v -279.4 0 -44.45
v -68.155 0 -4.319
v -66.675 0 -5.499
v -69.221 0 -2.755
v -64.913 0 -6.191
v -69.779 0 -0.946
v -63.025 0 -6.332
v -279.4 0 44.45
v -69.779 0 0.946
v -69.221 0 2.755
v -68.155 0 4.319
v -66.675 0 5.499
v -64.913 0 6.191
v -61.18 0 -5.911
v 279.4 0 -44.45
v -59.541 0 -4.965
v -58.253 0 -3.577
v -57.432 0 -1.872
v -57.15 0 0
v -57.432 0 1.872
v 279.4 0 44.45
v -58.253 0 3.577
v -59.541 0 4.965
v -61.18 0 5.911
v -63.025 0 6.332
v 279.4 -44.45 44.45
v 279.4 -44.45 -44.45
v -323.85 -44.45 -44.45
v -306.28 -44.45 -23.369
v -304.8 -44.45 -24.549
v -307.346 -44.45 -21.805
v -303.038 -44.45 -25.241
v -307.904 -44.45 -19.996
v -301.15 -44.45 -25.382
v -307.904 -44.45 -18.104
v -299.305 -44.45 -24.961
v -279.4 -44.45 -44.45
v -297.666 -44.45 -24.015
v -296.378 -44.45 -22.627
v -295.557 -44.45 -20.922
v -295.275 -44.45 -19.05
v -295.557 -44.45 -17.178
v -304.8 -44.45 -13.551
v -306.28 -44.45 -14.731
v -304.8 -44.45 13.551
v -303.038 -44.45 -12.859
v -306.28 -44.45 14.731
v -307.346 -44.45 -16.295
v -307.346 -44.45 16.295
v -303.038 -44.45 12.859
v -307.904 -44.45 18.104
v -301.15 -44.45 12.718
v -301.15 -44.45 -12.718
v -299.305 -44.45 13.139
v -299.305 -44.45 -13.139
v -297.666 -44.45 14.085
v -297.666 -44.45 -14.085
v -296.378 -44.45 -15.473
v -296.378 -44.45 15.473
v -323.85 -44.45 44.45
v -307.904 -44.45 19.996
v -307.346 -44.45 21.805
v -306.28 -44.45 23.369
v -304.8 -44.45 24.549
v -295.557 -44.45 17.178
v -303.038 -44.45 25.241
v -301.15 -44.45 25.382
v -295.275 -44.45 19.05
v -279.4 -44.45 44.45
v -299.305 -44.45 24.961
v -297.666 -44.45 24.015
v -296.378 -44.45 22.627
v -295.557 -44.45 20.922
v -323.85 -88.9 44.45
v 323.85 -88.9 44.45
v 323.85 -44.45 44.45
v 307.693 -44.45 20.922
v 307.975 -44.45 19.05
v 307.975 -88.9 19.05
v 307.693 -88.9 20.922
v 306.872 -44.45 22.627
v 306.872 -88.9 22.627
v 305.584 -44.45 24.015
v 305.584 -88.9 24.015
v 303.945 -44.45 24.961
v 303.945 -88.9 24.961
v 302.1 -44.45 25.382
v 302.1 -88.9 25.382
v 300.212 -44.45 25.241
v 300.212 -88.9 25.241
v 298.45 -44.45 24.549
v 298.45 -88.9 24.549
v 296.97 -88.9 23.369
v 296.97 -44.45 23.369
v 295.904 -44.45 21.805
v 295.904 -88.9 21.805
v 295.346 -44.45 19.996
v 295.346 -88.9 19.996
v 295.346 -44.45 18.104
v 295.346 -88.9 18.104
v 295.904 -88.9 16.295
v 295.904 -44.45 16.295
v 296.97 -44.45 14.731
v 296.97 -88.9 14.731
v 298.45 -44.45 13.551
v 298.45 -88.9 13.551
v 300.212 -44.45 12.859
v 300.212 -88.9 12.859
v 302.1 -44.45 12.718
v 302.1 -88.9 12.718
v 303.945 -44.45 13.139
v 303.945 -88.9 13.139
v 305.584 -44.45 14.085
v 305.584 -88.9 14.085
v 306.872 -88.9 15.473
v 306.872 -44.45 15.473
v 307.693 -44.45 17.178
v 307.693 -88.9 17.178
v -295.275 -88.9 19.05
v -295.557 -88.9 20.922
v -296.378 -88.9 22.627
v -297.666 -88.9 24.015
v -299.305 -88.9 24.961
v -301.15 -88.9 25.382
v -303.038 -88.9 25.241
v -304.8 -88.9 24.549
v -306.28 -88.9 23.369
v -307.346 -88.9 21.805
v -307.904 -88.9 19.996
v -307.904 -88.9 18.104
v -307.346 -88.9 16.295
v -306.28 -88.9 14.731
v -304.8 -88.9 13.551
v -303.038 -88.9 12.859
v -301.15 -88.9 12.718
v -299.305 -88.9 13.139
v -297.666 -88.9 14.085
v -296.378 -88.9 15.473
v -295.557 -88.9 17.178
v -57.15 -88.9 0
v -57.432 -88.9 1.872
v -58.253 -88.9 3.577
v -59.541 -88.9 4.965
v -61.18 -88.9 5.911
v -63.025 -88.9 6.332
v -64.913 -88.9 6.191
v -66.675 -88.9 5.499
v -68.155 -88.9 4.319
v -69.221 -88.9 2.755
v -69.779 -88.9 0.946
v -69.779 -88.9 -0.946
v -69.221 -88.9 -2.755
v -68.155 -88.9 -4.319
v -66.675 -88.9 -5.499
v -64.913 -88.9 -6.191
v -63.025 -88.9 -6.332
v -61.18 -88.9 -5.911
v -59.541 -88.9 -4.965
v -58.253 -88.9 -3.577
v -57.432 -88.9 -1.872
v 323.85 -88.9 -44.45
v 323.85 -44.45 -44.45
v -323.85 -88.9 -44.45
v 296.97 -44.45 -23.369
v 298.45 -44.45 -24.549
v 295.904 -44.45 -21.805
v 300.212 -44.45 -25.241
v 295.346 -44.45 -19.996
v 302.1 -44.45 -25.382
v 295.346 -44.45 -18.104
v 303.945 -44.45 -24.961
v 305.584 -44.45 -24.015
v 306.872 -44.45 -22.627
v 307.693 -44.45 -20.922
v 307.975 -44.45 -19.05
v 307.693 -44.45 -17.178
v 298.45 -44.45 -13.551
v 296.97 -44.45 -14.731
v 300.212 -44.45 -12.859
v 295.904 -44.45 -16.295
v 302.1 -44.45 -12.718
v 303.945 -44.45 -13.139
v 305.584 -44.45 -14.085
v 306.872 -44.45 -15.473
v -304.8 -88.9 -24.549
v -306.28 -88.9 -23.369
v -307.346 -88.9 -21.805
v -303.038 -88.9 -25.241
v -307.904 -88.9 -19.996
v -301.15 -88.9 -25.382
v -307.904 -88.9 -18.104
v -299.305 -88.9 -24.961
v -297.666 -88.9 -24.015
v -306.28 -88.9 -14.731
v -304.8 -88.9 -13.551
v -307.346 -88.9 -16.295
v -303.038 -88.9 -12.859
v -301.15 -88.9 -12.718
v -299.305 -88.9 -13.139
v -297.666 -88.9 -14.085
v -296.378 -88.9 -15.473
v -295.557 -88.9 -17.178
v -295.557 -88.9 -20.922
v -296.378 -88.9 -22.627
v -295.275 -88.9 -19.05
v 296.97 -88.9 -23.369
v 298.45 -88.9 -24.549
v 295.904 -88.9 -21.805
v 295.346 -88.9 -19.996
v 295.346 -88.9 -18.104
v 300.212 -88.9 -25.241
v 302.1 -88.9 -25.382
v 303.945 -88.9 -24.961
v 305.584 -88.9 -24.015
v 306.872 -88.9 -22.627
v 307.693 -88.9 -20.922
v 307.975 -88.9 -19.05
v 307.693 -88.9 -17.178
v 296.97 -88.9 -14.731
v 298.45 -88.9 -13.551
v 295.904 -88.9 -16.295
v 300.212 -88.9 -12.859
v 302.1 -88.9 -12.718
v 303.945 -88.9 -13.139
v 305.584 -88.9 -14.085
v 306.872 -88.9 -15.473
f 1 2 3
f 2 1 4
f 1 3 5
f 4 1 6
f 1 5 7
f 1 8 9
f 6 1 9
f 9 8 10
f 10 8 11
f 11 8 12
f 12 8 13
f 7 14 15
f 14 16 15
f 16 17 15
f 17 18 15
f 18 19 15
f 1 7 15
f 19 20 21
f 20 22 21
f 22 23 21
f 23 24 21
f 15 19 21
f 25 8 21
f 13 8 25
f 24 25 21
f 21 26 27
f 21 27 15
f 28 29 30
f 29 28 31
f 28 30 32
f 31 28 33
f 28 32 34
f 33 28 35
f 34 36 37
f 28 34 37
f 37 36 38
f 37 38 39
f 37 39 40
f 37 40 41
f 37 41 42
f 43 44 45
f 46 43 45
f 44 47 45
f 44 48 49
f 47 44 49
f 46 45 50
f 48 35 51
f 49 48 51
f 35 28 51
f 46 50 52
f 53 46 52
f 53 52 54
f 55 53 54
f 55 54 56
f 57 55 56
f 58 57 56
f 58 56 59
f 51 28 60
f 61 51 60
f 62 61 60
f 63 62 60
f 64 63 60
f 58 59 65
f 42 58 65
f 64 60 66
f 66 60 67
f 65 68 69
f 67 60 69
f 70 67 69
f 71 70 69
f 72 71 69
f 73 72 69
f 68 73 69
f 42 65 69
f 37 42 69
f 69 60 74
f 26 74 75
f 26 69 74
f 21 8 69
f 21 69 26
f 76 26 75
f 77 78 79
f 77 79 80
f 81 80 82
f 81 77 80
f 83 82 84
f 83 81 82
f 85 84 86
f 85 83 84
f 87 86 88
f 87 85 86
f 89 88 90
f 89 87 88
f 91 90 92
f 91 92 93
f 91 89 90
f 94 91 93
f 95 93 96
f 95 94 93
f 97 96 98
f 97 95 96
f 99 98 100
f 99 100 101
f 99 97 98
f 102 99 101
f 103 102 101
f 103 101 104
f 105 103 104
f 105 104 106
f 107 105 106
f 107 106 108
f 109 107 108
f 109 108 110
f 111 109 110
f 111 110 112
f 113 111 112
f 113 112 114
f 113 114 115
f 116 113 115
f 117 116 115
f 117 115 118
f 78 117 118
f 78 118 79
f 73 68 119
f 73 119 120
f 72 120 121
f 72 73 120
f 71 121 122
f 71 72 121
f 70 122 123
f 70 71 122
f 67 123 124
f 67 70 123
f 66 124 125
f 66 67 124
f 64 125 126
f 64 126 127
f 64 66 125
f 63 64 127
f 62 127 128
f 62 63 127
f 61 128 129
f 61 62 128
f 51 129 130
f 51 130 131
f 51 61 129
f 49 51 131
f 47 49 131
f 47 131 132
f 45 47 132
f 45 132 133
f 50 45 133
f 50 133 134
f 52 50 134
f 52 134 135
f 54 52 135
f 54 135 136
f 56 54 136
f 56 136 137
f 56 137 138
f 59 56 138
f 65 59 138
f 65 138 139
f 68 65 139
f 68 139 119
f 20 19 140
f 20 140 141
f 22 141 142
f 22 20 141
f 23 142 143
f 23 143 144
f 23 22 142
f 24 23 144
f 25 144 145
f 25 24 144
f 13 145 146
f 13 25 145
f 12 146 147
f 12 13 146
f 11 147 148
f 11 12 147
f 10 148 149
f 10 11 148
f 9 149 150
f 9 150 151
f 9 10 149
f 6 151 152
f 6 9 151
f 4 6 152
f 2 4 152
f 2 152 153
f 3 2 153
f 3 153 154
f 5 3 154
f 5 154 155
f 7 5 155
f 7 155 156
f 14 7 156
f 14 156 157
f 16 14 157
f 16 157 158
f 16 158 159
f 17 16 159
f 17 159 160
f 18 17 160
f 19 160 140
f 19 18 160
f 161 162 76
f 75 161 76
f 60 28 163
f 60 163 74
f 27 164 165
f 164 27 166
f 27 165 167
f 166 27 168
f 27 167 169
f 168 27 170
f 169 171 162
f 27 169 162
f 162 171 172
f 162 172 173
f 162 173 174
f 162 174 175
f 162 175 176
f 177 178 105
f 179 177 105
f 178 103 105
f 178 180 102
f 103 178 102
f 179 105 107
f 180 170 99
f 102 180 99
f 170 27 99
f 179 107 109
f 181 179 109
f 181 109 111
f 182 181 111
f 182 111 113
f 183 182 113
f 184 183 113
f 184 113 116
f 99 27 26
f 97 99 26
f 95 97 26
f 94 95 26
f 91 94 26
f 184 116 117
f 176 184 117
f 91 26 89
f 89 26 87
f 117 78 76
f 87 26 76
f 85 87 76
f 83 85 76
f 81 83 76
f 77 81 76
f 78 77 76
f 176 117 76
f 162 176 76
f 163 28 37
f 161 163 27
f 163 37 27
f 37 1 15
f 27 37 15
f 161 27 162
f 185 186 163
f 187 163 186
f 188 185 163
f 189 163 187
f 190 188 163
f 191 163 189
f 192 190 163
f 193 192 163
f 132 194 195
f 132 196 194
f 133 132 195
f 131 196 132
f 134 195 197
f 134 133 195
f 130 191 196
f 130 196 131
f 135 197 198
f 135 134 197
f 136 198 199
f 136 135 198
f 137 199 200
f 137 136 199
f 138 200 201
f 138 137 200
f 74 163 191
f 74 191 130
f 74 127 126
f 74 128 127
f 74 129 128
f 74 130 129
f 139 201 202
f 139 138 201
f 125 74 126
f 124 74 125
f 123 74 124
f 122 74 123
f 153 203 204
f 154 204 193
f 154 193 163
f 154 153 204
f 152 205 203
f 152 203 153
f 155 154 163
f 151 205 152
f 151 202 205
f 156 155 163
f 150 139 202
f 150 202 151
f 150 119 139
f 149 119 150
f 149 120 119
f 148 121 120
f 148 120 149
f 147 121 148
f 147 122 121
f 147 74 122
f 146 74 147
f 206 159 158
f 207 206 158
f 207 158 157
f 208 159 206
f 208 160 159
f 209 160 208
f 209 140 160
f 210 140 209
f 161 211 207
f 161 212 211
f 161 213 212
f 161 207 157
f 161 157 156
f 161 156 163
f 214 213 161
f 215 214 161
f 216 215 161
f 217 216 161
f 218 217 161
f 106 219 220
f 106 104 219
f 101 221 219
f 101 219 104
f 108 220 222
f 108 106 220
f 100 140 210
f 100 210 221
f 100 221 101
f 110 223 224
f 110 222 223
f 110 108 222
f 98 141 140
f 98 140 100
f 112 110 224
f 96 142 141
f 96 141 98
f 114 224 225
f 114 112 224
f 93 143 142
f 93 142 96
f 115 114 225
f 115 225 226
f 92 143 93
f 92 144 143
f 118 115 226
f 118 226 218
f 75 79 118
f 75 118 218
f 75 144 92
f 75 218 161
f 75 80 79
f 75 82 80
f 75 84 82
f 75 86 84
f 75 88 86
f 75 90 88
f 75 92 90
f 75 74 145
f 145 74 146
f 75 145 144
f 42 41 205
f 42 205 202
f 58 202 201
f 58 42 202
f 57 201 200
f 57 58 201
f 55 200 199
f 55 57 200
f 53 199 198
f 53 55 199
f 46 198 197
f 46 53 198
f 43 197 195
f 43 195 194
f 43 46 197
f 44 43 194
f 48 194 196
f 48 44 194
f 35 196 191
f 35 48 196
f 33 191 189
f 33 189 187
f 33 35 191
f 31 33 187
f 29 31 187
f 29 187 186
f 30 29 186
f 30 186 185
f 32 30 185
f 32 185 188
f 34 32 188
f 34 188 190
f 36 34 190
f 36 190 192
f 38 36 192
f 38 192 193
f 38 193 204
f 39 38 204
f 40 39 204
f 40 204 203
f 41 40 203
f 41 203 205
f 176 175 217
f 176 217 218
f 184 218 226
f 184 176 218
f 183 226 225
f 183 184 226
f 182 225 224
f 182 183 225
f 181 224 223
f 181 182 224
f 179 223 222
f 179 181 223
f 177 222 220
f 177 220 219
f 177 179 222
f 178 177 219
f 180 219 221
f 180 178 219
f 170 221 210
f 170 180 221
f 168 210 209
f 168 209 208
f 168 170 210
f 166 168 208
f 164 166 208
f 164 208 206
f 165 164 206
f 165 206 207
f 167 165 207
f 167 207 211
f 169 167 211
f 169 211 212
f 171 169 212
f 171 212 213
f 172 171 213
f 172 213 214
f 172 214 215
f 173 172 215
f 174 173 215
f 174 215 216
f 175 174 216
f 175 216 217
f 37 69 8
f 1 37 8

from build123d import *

# Parameters (mm, degrees)
F0_W     = 647.7
F0_H     = 88.9
F0_R     = 6.35
F1_DEPTH = 88.9
F2_W     = 44.45
F2_H     = 44.45
F3_DEPTH = 101.6


with BuildPart() as f1:
    # F0 (on Front) → F1 (new body)
    with BuildSketch(Plane.XZ):
        Rectangle(F0_W, F0_H)
        with Locations((-301.625, -19.05)):
            Circle(F0_R, mode=Mode.SUBTRACT)
        with Locations((301.625, -19.05)):
            Circle(F0_R, mode=Mode.SUBTRACT)
        with Locations((-301.625, 19.05)):
            Circle(F0_R, mode=Mode.SUBTRACT)
        with Locations((-63.5, 0)):
            Circle(F0_R, mode=Mode.SUBTRACT)
        with Locations((301.625, 19.05)):
            Circle(F0_R, mode=Mode.SUBTRACT)
    extrude(amount=F1_DEPTH)

    # F2 (on face) → F3 (cut)
    with BuildSketch(Plane.XY.offset(44.45)):
        with Locations((-301.625, -22.225)):
            Rectangle(F2_W, F2_H)
        with Locations((301.625, -22.225)):
            Rectangle(F2_W, F2_H)
    extrude(amount=-F3_DEPTH, mode=Mode.SUBTRACT)


solid = f1.part
